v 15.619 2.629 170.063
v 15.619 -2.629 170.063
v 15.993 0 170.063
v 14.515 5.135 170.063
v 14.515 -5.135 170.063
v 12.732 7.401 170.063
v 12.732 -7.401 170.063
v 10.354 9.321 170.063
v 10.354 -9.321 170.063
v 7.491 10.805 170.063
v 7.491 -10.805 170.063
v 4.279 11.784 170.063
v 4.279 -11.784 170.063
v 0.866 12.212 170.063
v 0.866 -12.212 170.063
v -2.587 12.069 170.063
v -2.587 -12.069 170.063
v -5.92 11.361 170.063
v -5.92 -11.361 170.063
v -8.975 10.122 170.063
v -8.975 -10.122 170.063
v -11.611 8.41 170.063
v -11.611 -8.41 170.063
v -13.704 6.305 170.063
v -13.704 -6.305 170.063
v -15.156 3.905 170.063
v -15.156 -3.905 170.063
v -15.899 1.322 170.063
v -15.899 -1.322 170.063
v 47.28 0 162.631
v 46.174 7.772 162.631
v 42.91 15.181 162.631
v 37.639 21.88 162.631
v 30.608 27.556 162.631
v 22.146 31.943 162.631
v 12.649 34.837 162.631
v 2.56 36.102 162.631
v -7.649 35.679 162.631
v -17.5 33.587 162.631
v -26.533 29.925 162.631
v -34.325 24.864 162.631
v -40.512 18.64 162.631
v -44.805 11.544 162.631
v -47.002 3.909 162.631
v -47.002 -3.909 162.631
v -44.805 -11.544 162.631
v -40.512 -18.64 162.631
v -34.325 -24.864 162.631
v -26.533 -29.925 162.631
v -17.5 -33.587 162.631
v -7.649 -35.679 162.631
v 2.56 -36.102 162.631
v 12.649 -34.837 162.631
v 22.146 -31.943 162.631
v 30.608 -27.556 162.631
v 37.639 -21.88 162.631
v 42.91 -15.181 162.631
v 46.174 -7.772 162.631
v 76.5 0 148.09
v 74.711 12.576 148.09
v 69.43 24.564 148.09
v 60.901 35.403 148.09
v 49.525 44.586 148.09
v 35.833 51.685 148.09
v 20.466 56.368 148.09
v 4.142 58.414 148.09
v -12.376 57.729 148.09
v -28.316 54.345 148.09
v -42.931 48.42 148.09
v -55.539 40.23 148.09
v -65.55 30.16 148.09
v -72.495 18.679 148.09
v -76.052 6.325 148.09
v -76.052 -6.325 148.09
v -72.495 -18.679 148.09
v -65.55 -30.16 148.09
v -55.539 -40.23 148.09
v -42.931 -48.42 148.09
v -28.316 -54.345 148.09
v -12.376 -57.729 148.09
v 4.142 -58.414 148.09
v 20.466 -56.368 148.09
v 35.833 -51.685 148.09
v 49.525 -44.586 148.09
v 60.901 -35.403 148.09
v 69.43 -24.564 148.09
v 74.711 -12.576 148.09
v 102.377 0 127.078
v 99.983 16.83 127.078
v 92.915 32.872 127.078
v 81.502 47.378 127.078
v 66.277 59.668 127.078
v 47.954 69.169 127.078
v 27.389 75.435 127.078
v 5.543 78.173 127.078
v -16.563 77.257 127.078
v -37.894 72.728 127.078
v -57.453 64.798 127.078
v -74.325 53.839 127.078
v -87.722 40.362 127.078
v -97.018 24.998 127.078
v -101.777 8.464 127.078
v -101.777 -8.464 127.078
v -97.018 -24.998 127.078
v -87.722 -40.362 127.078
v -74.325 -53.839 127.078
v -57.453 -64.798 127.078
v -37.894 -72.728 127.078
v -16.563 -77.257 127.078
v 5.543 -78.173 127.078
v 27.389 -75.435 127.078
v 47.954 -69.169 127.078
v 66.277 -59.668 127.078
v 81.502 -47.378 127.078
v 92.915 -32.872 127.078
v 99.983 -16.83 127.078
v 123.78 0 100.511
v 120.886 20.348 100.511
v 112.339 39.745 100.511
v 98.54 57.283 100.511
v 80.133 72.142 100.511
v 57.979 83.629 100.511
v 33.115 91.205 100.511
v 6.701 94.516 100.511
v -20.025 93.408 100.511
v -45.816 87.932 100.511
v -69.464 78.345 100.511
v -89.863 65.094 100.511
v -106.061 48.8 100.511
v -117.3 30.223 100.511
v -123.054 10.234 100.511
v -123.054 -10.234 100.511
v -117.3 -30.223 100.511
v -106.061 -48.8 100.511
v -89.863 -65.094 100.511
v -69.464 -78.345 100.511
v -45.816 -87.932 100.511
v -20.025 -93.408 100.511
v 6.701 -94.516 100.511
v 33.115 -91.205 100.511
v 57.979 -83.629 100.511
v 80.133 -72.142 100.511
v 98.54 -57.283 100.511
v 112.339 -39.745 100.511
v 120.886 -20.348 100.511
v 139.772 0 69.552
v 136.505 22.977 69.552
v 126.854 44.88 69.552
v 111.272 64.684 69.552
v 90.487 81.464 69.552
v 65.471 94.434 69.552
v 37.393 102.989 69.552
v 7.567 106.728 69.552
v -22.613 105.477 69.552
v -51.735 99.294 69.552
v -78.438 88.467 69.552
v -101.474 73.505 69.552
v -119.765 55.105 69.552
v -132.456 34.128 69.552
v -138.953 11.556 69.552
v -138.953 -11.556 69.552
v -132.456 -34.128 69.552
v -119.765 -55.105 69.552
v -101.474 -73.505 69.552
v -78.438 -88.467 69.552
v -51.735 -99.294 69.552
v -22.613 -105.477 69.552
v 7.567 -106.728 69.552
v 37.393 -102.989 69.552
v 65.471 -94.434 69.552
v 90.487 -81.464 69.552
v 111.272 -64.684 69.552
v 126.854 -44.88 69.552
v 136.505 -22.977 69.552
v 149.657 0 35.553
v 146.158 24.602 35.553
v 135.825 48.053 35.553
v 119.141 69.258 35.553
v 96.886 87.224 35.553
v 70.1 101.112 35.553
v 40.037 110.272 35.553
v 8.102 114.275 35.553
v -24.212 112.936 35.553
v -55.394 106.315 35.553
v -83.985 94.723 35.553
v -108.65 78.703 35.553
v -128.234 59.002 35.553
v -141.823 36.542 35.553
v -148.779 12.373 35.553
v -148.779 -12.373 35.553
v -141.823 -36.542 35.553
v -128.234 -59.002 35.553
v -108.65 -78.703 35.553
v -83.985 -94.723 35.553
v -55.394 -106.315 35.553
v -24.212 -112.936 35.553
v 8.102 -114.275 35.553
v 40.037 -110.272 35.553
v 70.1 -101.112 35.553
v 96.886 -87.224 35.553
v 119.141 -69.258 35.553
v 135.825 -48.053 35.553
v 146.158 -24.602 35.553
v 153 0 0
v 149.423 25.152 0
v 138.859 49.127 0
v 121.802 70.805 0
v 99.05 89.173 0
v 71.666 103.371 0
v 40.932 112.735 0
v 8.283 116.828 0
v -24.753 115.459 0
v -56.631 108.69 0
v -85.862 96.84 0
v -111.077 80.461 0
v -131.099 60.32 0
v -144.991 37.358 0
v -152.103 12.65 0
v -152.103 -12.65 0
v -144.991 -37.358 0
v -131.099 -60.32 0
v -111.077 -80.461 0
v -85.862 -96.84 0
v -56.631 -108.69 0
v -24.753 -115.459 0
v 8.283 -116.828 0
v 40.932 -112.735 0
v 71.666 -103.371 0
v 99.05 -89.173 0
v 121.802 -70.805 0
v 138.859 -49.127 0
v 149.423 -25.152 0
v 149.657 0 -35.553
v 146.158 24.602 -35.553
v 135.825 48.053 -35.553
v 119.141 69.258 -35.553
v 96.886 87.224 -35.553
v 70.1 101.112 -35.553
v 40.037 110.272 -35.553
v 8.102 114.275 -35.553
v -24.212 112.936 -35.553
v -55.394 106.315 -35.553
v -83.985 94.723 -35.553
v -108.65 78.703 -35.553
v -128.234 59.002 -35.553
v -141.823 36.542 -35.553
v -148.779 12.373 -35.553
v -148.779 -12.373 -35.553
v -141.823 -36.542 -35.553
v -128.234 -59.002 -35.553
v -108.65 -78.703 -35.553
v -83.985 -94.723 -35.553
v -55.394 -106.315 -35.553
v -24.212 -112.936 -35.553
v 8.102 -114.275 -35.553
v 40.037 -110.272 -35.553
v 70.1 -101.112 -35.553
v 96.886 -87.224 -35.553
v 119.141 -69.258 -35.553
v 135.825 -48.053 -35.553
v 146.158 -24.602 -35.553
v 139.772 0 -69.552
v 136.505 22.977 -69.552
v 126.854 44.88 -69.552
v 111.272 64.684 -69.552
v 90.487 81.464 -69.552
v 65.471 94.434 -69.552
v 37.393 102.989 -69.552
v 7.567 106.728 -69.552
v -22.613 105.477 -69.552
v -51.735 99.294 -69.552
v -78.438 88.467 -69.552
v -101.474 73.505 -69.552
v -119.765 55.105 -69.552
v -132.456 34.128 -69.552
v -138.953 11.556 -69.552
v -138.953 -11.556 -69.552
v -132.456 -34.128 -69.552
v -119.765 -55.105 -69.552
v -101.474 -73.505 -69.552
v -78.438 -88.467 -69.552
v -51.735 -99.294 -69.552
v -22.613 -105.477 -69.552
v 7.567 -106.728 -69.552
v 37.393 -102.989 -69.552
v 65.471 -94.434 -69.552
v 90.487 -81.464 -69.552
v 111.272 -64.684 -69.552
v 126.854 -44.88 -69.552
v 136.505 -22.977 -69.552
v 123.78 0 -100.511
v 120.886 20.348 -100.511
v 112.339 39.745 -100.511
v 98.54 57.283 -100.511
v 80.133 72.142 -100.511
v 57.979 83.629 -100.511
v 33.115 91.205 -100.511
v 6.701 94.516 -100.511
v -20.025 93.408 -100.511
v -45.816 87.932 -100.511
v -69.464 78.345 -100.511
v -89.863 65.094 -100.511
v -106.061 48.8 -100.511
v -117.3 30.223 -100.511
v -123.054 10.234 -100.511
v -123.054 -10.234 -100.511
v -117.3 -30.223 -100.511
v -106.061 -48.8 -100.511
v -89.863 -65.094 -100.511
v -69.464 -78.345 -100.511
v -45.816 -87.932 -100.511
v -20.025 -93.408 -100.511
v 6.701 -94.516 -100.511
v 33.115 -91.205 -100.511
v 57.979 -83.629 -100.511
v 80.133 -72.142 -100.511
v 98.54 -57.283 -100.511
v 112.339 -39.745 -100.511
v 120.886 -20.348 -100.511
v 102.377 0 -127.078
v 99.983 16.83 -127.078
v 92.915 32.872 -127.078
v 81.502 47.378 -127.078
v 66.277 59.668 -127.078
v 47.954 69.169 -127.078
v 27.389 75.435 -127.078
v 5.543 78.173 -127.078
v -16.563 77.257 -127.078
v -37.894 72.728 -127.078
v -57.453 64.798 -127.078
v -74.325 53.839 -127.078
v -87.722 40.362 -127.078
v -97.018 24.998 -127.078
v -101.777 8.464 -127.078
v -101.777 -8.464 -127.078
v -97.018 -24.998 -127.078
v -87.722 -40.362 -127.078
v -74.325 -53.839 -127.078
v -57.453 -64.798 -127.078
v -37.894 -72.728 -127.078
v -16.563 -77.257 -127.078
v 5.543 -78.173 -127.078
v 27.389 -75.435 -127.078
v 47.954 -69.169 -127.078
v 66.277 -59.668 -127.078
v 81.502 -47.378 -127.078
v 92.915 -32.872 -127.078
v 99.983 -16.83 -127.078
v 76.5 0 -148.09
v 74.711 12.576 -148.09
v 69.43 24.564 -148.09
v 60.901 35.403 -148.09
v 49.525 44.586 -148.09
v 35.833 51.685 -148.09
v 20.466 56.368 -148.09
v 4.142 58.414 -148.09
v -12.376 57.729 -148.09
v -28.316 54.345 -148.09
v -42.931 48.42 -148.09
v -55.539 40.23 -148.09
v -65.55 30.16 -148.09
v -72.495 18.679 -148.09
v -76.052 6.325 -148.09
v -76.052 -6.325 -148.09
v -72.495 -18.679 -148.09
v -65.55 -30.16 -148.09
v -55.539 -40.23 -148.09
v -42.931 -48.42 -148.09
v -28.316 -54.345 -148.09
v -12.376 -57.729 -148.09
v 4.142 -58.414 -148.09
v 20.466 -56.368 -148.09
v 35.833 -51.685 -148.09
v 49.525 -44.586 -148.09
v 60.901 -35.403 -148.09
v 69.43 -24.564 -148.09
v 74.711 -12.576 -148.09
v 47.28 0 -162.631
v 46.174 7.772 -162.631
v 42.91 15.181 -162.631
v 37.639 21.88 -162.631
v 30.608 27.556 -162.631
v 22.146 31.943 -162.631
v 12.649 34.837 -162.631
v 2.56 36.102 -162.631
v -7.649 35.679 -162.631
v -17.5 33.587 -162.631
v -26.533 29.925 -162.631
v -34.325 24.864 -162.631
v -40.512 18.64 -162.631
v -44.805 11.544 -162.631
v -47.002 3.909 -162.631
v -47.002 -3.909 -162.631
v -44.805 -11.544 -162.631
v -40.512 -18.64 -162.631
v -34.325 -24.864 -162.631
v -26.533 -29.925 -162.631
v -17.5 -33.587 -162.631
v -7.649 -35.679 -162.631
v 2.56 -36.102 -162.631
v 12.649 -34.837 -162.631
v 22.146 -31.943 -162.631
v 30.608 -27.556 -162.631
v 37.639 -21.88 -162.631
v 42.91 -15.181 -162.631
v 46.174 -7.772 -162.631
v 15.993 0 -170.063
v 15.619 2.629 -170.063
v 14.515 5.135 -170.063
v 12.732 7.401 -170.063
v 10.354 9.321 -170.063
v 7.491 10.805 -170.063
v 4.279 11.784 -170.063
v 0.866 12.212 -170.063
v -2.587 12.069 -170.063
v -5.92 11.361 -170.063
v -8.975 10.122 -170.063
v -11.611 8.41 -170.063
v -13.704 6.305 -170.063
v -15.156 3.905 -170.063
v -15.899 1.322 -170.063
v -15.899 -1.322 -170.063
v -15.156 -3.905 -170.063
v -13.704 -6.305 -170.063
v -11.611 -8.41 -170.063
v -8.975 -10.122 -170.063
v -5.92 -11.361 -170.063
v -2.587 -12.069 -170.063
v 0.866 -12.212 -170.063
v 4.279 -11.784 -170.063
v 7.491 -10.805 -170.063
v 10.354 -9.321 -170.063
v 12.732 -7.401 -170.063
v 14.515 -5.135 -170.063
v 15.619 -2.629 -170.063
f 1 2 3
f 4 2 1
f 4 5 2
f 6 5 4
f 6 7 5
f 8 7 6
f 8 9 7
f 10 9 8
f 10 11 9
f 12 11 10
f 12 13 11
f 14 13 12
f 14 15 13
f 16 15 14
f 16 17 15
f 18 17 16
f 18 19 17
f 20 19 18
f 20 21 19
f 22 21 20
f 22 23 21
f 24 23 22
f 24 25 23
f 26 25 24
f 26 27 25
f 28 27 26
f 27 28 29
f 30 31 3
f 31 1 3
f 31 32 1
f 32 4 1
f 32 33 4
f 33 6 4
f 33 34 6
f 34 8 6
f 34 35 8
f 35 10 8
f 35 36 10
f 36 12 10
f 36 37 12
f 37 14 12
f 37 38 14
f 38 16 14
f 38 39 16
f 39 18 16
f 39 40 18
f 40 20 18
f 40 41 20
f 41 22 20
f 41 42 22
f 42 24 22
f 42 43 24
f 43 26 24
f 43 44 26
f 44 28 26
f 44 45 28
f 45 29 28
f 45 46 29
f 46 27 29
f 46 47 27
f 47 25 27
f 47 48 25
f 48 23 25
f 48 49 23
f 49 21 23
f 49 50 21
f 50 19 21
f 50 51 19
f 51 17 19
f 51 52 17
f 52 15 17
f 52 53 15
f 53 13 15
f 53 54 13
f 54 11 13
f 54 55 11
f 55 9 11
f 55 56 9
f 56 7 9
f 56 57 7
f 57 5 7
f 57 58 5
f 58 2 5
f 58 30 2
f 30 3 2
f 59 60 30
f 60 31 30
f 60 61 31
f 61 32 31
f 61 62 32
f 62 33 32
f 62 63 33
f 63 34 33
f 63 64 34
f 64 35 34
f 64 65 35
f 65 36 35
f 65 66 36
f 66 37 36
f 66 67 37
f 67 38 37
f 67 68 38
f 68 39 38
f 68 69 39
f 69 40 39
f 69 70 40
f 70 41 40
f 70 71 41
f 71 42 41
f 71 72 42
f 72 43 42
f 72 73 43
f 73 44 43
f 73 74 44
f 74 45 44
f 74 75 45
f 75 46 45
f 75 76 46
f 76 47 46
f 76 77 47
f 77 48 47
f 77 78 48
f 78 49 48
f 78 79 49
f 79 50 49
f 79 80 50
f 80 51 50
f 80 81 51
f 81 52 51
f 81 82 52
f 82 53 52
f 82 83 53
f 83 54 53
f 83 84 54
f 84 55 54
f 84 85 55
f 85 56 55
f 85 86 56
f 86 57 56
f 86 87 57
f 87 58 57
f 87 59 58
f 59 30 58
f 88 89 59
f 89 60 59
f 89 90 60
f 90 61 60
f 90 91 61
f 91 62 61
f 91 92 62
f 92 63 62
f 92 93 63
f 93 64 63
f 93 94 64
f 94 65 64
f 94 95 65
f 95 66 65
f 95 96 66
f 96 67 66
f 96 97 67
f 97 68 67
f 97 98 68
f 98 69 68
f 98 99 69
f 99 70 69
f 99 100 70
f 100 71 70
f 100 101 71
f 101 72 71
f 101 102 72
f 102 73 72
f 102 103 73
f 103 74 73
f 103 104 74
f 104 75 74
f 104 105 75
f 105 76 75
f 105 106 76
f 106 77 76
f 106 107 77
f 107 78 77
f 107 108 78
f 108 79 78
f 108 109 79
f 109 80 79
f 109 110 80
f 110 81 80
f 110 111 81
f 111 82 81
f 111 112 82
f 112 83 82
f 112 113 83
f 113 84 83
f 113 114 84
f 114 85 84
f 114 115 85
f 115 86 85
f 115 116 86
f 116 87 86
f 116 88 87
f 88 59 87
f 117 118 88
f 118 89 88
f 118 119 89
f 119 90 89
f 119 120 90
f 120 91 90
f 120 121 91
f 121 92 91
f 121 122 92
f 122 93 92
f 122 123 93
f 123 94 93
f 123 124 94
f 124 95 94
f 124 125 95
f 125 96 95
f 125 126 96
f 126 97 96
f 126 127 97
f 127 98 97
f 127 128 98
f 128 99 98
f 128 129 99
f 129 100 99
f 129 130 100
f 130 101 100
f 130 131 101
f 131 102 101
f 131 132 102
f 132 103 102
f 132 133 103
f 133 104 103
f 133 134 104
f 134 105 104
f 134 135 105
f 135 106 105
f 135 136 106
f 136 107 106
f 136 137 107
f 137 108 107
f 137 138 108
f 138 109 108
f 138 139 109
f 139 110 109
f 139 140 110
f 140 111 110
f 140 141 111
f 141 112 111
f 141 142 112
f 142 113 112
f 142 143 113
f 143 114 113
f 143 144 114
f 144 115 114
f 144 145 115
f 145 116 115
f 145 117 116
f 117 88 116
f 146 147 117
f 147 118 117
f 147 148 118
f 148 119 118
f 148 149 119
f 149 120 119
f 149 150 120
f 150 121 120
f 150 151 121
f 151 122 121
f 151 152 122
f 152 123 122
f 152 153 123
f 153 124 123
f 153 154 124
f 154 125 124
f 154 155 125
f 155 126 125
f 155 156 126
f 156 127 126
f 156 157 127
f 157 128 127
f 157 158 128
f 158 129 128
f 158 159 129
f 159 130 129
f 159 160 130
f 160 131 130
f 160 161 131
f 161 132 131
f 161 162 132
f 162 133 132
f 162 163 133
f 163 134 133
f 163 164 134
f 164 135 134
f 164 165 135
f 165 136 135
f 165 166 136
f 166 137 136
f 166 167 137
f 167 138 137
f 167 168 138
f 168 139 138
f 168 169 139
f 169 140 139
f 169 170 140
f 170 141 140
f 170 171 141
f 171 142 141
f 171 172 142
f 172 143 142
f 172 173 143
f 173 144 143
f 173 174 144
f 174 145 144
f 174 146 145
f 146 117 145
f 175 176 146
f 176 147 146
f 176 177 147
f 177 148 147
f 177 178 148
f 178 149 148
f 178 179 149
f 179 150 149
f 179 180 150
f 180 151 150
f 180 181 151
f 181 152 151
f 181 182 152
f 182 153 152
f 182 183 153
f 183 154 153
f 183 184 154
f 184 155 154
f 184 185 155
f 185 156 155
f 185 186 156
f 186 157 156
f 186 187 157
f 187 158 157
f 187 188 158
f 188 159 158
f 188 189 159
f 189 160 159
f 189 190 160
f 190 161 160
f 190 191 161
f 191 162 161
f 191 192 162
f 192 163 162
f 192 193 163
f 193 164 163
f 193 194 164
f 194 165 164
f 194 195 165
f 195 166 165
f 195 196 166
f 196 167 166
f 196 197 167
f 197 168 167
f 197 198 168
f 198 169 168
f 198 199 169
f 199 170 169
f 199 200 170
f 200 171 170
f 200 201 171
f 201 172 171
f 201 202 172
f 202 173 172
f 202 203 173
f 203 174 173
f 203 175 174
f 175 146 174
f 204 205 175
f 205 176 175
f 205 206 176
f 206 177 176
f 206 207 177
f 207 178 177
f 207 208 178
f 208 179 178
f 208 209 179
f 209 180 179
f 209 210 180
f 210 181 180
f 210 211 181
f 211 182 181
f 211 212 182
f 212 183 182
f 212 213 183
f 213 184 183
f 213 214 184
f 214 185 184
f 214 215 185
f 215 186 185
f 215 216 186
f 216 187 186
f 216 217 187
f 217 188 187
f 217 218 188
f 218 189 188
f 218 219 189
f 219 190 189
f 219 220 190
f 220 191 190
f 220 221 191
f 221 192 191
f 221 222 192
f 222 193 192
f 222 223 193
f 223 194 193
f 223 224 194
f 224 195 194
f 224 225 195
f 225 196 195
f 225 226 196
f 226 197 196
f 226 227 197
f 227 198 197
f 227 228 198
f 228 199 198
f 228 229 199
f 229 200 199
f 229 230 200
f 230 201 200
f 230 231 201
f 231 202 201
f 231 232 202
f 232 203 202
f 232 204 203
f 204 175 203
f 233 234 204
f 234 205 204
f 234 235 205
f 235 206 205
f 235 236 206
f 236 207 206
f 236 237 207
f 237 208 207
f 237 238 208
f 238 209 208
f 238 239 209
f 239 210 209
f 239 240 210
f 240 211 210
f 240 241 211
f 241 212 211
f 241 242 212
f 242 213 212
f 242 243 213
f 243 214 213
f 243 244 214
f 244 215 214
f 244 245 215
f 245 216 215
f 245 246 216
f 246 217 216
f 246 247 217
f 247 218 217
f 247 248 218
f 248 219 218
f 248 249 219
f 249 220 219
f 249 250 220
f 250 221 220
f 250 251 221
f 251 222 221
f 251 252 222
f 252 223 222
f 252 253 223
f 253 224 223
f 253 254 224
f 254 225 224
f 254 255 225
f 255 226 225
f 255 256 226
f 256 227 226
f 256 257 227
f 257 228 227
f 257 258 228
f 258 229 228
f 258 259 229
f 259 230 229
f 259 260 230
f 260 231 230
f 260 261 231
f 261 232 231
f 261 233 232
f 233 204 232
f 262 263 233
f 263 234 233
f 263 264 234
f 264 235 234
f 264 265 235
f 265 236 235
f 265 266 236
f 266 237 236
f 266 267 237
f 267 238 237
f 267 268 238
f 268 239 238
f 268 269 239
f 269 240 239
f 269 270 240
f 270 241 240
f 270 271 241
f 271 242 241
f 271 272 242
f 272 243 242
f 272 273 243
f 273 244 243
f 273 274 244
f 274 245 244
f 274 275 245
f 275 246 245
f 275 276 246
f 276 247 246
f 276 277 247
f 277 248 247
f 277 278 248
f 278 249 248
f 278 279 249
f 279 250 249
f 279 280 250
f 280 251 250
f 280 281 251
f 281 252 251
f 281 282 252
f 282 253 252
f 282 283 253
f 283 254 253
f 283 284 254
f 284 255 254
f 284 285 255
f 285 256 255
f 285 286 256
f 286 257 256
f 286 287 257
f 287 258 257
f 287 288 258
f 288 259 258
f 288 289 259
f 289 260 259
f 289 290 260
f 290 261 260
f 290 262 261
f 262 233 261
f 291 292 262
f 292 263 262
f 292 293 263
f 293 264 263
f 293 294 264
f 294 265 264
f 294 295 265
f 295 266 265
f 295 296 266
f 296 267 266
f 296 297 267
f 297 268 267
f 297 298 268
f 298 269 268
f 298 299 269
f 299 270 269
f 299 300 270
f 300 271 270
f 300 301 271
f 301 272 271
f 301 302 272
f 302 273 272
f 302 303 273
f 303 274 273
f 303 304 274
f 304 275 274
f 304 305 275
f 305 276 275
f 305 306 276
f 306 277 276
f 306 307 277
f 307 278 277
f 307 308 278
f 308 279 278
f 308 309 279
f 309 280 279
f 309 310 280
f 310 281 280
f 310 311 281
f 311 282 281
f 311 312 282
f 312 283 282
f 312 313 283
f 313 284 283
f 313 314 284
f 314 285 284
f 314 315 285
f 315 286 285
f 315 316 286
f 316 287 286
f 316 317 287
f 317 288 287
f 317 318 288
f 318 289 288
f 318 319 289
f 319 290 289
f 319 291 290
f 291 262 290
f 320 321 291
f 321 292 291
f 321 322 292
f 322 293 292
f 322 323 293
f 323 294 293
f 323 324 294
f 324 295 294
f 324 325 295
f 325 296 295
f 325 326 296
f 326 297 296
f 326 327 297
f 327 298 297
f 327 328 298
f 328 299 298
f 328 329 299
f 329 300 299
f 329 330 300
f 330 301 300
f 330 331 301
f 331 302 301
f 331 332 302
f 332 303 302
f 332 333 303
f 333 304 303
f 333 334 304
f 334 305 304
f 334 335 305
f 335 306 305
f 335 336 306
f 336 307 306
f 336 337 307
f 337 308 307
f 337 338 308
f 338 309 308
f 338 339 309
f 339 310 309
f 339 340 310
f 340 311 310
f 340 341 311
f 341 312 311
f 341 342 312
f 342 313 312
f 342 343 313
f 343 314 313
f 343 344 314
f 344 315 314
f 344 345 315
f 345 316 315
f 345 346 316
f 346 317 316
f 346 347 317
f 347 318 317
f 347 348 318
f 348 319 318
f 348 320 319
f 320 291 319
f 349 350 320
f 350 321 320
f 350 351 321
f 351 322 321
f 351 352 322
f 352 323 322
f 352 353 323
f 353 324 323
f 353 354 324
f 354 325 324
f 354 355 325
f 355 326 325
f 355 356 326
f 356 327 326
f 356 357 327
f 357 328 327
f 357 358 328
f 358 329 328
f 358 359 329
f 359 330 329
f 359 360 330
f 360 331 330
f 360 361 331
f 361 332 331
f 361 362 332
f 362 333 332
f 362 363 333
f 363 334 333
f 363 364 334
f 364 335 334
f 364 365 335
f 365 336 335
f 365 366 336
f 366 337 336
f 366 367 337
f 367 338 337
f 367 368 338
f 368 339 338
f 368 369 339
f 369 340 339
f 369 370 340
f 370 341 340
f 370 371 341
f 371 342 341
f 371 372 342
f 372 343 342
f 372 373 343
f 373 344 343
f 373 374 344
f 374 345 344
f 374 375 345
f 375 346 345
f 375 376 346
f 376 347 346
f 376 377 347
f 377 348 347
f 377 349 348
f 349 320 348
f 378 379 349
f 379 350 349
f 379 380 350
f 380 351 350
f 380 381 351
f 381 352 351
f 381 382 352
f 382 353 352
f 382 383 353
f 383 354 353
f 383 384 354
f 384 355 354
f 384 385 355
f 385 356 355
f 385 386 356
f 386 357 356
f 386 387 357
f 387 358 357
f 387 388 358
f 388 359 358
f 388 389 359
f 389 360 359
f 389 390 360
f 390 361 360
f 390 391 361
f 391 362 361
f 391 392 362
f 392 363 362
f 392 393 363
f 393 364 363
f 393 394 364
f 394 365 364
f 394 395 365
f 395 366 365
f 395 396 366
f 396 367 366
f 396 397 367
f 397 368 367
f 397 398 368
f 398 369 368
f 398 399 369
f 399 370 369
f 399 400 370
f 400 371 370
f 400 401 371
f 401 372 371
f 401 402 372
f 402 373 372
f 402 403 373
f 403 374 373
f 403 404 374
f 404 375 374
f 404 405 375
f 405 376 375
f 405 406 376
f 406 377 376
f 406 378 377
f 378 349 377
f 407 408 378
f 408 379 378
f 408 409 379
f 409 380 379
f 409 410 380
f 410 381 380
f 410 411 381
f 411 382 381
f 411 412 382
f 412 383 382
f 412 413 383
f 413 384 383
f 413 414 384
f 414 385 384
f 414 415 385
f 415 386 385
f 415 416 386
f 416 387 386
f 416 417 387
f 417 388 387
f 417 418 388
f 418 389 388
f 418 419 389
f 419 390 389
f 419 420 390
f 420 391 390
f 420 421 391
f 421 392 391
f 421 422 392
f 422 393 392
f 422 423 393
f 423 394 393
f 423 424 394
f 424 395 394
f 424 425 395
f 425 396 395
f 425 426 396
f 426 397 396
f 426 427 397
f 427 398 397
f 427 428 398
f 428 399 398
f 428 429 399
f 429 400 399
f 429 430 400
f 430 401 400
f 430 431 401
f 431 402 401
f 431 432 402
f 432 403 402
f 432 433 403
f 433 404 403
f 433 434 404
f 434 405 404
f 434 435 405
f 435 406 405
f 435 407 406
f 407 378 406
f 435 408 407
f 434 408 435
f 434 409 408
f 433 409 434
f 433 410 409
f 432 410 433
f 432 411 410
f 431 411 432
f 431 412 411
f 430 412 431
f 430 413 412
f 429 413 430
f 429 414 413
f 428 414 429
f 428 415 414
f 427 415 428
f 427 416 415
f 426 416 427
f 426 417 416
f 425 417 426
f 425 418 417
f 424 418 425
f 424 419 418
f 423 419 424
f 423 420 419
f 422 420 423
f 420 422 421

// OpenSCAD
// Generated by SolidPython 1.0.1 on 2020-07-29 00:46:53


scale(v = [17, 13, 19]) {
	sphere(r = 9);
}
/***********************************************
*********      SolidPython code:      **********
************************************************
 
# import packages: SolidPython
from solid import *
from solid.utils import *
from itertools import chain, combinations, permutations


class Resize:

    def __init__(self, scad_file):
        self.scad_file = scad_file
        #self.scad_file = import_scad(scad_file)
        # cone/cylinder param:
        self.r1 = 0
        self.r2 = 0
        self.h = 0
        # rectangular prism param:
        self.w = 0
        self.l = 0
        # ellipse param:
        self.r = 0

    # import OpenScad code (file name corresponds to shape)


    # classify shape + parameters
    def assign(self, param1, param2, param3):
        if self.scad_file == 'cone.scad':
            self.r1 = param1
            self.r2 = param2
            self.h = param3
        elif self.scad_file == 'cylinder.scad':
            self.r1 = param1
            self.r2 = param2
            self.h = param3
        elif self.scad_file == 'rectangularPrism.scad':
            self.h = param1
            self.l = param2
            self.w = param3
        else:
            self.r = param1
            self.h = param2

    # resize parameters
    def iterate(self):
        x = range(3, 20, 2)
        i = 1
        if self.scad_file == 'cone.scad':
            tempList = list(permutations(x, 2))
            for temp in tempList:
                param1 = temp[0]
                param2 = temp[1]
                filepath = 'produced_scad_files/' + 'cone' + str(param1) + '_' + str(param2) + '_' + '.scad'
                scad_render_to_file(cylinder(h=param1, r1=param2, r2=0), filepath)

        elif self.scad_file == 'cylinder.scad':
            tempList = list(permutations(x, 3))
            for temp in tempList:
                param1 = temp[0]
                param2 = temp[1]
                filepath = 'produced_scad_files/' + 'cylinder' + str(param1) + '_' + str(param2) + '_' + '.scad'
                scad_render_to_file(cylinder(h=param1, r1=param2, r2=param2), filepath)

        elif self.scad_file == 'rectangularPrism.scad':
            tempList = list(permutations(x, 3))
            for temp in tempList:
                param1 = temp[0]
                param2 = temp[1]
                param3 = temp[2]
                filepath = 'produced_scad_files/' + 'rectangularPrism' + str(param1) + '_' + str(param2) + '_' + str(
                    param3) + '.scad'
                scad_render_to_file(cube(size=(param1, param2, param3)), filepath)

        elif self.scad_file == 'ellipse.scad':
            tempList = list(permutations(x, 4))
            for temp in tempList:
                param1 = temp[0]
                param2 = temp[1]
                param3 = temp[2]
                param4 = temp[3]
                filepath = 'produced_scad_files/' + 'ellipse' + str(param1) + '_' + str(param2) + '_' + str(param3) + '_' + str(param4) + '.scad'
                scad_render_to_file(scale([param1, param2, param3])(sphere(r=param4)), filepath)

    def render_to_scadfile(self):
        scad_render_to_file(scad, 'example.scad') 
 
************************************************/
